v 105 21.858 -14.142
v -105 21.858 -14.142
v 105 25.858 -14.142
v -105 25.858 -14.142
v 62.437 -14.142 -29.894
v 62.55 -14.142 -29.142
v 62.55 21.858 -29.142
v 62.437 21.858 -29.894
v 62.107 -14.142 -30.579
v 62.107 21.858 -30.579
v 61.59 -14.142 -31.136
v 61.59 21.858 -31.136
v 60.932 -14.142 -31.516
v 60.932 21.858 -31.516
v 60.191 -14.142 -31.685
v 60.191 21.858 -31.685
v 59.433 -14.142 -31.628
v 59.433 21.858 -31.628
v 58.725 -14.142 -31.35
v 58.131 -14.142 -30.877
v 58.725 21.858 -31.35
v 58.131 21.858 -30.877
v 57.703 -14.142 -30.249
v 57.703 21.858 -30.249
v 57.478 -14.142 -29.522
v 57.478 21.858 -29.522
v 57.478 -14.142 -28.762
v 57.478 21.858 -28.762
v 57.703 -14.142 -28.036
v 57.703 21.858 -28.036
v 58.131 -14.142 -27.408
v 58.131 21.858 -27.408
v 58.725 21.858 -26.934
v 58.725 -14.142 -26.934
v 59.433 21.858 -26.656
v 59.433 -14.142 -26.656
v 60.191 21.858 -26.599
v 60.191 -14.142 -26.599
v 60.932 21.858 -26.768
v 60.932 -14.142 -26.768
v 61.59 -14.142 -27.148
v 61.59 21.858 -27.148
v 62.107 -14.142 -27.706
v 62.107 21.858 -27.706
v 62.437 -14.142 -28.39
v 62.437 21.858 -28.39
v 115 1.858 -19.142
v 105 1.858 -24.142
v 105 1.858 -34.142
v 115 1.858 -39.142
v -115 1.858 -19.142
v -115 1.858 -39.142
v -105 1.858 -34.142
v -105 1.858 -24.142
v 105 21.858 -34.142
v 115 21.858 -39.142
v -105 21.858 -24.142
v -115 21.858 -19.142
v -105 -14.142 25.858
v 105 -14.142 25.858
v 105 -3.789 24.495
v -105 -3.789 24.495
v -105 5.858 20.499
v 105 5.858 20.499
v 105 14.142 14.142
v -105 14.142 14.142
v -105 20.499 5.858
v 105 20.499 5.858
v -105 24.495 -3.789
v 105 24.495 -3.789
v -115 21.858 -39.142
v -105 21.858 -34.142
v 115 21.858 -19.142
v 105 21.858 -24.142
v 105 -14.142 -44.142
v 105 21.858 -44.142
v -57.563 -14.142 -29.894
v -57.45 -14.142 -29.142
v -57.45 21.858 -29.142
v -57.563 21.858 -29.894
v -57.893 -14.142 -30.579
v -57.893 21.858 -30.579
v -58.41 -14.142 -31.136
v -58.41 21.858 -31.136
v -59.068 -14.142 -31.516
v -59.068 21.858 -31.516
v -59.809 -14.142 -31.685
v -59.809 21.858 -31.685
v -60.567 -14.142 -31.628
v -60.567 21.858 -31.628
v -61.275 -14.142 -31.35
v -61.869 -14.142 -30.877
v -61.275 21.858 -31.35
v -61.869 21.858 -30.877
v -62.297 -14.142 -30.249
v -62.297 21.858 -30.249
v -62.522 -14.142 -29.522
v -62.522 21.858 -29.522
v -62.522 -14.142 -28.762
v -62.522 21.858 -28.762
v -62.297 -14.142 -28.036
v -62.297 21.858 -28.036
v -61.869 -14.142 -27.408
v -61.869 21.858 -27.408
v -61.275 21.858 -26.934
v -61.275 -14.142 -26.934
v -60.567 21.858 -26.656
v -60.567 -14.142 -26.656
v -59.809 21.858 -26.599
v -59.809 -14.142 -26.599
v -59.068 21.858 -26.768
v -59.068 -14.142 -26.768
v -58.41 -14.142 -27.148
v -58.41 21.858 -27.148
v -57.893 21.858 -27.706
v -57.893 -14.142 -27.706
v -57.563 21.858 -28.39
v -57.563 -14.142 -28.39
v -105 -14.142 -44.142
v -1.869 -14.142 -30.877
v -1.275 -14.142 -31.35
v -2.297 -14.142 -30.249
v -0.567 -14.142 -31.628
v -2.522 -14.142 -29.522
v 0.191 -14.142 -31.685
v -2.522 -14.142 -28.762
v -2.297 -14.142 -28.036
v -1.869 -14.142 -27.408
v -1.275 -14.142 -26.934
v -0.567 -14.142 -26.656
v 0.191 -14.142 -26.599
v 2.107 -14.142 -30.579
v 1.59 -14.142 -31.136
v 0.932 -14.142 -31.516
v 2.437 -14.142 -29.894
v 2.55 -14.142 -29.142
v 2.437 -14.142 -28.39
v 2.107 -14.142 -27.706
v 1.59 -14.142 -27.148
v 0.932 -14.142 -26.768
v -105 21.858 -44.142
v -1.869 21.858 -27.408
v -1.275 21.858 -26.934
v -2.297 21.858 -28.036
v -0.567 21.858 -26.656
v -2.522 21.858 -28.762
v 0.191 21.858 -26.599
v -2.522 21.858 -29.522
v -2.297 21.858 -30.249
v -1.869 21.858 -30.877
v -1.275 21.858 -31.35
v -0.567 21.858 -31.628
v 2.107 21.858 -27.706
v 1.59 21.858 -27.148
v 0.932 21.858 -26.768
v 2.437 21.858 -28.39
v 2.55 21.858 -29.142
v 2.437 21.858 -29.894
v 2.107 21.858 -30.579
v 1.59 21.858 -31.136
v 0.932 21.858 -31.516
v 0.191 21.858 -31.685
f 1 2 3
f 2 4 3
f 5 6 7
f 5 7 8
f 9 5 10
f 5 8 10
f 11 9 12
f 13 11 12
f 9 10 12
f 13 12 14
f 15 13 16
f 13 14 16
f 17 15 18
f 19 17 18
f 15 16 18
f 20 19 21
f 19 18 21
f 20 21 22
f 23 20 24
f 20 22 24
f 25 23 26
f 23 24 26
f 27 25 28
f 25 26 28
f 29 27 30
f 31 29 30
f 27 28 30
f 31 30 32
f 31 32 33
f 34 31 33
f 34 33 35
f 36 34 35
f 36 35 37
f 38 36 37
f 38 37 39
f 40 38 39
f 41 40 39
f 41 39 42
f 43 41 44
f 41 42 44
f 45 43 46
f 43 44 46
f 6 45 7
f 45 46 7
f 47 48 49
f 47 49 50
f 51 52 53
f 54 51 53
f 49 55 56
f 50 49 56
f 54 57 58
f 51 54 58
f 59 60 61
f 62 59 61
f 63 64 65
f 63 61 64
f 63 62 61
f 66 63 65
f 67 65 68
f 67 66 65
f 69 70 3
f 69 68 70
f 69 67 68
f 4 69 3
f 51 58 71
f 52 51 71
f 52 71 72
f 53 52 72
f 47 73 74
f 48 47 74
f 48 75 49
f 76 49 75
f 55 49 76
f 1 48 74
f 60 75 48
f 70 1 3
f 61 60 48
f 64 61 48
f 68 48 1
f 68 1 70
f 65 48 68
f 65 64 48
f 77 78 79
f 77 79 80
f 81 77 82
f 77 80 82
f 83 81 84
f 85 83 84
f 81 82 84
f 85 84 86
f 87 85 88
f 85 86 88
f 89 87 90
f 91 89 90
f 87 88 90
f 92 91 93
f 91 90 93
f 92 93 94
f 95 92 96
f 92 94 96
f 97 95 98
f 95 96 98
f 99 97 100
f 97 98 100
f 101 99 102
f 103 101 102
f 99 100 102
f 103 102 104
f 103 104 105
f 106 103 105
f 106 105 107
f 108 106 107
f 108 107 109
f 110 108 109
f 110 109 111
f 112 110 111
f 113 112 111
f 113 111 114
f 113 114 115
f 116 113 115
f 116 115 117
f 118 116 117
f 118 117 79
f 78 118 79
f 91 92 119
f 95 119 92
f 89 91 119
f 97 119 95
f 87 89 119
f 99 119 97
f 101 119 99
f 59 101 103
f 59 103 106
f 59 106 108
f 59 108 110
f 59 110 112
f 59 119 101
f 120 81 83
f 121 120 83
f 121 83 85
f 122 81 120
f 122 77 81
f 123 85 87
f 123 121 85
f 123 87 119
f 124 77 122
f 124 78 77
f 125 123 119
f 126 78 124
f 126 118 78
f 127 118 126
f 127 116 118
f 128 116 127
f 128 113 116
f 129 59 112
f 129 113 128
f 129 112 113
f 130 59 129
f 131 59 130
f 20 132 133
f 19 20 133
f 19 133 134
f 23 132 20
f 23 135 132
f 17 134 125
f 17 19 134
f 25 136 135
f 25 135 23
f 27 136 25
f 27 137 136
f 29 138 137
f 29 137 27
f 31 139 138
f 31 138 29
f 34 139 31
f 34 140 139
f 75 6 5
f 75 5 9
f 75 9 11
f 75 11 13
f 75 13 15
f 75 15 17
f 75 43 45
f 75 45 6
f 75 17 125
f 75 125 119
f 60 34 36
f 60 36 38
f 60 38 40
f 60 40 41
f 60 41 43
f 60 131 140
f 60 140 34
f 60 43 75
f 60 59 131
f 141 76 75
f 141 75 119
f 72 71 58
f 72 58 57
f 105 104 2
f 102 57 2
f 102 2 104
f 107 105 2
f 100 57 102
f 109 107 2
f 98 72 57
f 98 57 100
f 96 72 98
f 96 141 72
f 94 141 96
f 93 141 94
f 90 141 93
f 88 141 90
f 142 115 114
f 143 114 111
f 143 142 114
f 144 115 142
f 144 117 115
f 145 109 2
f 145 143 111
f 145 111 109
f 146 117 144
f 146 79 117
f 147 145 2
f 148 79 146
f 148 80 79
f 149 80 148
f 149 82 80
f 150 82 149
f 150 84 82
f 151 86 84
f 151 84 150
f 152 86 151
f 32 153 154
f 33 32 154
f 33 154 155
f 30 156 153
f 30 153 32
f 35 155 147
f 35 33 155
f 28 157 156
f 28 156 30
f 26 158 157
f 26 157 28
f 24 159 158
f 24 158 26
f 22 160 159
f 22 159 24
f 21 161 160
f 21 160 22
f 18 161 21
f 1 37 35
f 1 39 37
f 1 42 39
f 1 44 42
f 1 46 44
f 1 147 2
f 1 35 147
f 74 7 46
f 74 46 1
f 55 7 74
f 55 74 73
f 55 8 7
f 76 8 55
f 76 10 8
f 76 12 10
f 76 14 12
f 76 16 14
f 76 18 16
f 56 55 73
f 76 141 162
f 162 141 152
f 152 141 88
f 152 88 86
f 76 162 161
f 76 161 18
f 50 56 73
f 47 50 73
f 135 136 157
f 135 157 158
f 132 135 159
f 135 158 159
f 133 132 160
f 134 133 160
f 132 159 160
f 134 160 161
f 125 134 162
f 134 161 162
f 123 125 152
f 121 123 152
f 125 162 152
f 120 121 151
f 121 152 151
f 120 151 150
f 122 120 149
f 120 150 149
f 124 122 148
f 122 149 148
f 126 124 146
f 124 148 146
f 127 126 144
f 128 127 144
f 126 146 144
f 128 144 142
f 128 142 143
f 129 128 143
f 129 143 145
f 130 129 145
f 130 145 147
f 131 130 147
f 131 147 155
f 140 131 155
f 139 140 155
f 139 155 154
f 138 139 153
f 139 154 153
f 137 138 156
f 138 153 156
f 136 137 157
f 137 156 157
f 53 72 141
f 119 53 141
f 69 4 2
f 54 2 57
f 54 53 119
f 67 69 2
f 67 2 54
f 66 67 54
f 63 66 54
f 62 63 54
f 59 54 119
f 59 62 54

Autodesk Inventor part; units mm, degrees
sketch "Эскиз1" plane through (0, 0, 0) normal (1, 0, 0) x (0, 1, 0)
  line L0 (25.8579, -14.1421) -> (-14.1421, -14.1421)
  line L1 (-14.1421, -14.1421) -> (-14.1421, 25.8579)
  arc A0 (25.8579, -14.1421) -> (-14.1421, 25.8579) centre (-14.1421, -14.1421) ccw
  line L2 (-14.1421, -14.1421) -> (14.1421, 14.1421) construction
  point P0 (0, 0)
  point P1 (0, 0)
  dimension "d0" = 40
extrude "Выдавливание1" add sketch "Эскиз1" along normal mid plane 210
sketch "Эскиз2" plane through (105, 25.8579, -14.1421) normal (0, 0, -1) x (-1, 0, 0)
  line L0 (210, 0) -> (0, 0) projected
  line L1 (0, -40) -> (0, 0) projected
  line L2 (210, -40) -> (0, -40) projected
  line L3 (210, 0) -> (210, -40) projected
  point P0 (105, -25.8579)
extrude "Выдавливание2" add sketch "Эскиз2" along normal blind 30
sketch "Эскиз3" plane through (-105, 25.8579, -14.1421) normal (0, 1, 0) x (1, 0, 0)
  line L0 (0, 0) -> (210, 0) projected
  line L1 (210, 0) -> (210, 30) projected
  line L2 (0, 30) -> (210, 30) projected
  line L3 (0, 0) -> (0, 30) projected
  point P0 (105, -14.1421)
extrude "Выдавливание3" cut sketch "Эскиз3" against normal blind 4
sketch "Эскиз5" plane through (-105, 21.8579, -14.1421) normal (0, 1, 0) x (1, 0, 0)
  line L0 (210, -40) -> (210, 30) projected
  line L1 (210, 15) -> (0, 15) construction
  line L2 (0, -40) -> (0, 30) projected
  line L3 (0, 30) -> (210, 30) projected
  circle A0 centre (45, 15) radius 2.55
  line L4 (270, 15) -> (60, 15) construction
  circle A1 centre (105, 15) radius 2.55
  line L5 (330, 15) -> (120, 15) construction
  circle A2 centre (165, 15) radius 2.55
  dimension "d7" = 15
  dimension "d8" = 5.1
  dimension "d9" = 45
  dimension "d12" = 60
extrude "Выдавливание4" cut sketch "Эскиз5" against normal up to next
sketch "Эскиз6" plane through (-105, 21.8579, 25.8579) normal (0, -1, 0) x (1, 0, 0)
  line L0 (-10, -65) -> (0, -60) projected
  line L1 (-10, -45) -> (-10, -65) projected
  line L2 (0, -50) -> (-10, -45) projected
  line L3 (0, -40) -> (0, -70) projected
  point P0 (105, -25.8579)
extrude "Выдавливание5" add sketch "Эскиз6" along normal blind 20
mirror "Зеркальное отражение1" about plane through (0, 0, 0) normal (1, 0, 0) of "Выдавливание5"
properties part number "Край_новой_крышки"
